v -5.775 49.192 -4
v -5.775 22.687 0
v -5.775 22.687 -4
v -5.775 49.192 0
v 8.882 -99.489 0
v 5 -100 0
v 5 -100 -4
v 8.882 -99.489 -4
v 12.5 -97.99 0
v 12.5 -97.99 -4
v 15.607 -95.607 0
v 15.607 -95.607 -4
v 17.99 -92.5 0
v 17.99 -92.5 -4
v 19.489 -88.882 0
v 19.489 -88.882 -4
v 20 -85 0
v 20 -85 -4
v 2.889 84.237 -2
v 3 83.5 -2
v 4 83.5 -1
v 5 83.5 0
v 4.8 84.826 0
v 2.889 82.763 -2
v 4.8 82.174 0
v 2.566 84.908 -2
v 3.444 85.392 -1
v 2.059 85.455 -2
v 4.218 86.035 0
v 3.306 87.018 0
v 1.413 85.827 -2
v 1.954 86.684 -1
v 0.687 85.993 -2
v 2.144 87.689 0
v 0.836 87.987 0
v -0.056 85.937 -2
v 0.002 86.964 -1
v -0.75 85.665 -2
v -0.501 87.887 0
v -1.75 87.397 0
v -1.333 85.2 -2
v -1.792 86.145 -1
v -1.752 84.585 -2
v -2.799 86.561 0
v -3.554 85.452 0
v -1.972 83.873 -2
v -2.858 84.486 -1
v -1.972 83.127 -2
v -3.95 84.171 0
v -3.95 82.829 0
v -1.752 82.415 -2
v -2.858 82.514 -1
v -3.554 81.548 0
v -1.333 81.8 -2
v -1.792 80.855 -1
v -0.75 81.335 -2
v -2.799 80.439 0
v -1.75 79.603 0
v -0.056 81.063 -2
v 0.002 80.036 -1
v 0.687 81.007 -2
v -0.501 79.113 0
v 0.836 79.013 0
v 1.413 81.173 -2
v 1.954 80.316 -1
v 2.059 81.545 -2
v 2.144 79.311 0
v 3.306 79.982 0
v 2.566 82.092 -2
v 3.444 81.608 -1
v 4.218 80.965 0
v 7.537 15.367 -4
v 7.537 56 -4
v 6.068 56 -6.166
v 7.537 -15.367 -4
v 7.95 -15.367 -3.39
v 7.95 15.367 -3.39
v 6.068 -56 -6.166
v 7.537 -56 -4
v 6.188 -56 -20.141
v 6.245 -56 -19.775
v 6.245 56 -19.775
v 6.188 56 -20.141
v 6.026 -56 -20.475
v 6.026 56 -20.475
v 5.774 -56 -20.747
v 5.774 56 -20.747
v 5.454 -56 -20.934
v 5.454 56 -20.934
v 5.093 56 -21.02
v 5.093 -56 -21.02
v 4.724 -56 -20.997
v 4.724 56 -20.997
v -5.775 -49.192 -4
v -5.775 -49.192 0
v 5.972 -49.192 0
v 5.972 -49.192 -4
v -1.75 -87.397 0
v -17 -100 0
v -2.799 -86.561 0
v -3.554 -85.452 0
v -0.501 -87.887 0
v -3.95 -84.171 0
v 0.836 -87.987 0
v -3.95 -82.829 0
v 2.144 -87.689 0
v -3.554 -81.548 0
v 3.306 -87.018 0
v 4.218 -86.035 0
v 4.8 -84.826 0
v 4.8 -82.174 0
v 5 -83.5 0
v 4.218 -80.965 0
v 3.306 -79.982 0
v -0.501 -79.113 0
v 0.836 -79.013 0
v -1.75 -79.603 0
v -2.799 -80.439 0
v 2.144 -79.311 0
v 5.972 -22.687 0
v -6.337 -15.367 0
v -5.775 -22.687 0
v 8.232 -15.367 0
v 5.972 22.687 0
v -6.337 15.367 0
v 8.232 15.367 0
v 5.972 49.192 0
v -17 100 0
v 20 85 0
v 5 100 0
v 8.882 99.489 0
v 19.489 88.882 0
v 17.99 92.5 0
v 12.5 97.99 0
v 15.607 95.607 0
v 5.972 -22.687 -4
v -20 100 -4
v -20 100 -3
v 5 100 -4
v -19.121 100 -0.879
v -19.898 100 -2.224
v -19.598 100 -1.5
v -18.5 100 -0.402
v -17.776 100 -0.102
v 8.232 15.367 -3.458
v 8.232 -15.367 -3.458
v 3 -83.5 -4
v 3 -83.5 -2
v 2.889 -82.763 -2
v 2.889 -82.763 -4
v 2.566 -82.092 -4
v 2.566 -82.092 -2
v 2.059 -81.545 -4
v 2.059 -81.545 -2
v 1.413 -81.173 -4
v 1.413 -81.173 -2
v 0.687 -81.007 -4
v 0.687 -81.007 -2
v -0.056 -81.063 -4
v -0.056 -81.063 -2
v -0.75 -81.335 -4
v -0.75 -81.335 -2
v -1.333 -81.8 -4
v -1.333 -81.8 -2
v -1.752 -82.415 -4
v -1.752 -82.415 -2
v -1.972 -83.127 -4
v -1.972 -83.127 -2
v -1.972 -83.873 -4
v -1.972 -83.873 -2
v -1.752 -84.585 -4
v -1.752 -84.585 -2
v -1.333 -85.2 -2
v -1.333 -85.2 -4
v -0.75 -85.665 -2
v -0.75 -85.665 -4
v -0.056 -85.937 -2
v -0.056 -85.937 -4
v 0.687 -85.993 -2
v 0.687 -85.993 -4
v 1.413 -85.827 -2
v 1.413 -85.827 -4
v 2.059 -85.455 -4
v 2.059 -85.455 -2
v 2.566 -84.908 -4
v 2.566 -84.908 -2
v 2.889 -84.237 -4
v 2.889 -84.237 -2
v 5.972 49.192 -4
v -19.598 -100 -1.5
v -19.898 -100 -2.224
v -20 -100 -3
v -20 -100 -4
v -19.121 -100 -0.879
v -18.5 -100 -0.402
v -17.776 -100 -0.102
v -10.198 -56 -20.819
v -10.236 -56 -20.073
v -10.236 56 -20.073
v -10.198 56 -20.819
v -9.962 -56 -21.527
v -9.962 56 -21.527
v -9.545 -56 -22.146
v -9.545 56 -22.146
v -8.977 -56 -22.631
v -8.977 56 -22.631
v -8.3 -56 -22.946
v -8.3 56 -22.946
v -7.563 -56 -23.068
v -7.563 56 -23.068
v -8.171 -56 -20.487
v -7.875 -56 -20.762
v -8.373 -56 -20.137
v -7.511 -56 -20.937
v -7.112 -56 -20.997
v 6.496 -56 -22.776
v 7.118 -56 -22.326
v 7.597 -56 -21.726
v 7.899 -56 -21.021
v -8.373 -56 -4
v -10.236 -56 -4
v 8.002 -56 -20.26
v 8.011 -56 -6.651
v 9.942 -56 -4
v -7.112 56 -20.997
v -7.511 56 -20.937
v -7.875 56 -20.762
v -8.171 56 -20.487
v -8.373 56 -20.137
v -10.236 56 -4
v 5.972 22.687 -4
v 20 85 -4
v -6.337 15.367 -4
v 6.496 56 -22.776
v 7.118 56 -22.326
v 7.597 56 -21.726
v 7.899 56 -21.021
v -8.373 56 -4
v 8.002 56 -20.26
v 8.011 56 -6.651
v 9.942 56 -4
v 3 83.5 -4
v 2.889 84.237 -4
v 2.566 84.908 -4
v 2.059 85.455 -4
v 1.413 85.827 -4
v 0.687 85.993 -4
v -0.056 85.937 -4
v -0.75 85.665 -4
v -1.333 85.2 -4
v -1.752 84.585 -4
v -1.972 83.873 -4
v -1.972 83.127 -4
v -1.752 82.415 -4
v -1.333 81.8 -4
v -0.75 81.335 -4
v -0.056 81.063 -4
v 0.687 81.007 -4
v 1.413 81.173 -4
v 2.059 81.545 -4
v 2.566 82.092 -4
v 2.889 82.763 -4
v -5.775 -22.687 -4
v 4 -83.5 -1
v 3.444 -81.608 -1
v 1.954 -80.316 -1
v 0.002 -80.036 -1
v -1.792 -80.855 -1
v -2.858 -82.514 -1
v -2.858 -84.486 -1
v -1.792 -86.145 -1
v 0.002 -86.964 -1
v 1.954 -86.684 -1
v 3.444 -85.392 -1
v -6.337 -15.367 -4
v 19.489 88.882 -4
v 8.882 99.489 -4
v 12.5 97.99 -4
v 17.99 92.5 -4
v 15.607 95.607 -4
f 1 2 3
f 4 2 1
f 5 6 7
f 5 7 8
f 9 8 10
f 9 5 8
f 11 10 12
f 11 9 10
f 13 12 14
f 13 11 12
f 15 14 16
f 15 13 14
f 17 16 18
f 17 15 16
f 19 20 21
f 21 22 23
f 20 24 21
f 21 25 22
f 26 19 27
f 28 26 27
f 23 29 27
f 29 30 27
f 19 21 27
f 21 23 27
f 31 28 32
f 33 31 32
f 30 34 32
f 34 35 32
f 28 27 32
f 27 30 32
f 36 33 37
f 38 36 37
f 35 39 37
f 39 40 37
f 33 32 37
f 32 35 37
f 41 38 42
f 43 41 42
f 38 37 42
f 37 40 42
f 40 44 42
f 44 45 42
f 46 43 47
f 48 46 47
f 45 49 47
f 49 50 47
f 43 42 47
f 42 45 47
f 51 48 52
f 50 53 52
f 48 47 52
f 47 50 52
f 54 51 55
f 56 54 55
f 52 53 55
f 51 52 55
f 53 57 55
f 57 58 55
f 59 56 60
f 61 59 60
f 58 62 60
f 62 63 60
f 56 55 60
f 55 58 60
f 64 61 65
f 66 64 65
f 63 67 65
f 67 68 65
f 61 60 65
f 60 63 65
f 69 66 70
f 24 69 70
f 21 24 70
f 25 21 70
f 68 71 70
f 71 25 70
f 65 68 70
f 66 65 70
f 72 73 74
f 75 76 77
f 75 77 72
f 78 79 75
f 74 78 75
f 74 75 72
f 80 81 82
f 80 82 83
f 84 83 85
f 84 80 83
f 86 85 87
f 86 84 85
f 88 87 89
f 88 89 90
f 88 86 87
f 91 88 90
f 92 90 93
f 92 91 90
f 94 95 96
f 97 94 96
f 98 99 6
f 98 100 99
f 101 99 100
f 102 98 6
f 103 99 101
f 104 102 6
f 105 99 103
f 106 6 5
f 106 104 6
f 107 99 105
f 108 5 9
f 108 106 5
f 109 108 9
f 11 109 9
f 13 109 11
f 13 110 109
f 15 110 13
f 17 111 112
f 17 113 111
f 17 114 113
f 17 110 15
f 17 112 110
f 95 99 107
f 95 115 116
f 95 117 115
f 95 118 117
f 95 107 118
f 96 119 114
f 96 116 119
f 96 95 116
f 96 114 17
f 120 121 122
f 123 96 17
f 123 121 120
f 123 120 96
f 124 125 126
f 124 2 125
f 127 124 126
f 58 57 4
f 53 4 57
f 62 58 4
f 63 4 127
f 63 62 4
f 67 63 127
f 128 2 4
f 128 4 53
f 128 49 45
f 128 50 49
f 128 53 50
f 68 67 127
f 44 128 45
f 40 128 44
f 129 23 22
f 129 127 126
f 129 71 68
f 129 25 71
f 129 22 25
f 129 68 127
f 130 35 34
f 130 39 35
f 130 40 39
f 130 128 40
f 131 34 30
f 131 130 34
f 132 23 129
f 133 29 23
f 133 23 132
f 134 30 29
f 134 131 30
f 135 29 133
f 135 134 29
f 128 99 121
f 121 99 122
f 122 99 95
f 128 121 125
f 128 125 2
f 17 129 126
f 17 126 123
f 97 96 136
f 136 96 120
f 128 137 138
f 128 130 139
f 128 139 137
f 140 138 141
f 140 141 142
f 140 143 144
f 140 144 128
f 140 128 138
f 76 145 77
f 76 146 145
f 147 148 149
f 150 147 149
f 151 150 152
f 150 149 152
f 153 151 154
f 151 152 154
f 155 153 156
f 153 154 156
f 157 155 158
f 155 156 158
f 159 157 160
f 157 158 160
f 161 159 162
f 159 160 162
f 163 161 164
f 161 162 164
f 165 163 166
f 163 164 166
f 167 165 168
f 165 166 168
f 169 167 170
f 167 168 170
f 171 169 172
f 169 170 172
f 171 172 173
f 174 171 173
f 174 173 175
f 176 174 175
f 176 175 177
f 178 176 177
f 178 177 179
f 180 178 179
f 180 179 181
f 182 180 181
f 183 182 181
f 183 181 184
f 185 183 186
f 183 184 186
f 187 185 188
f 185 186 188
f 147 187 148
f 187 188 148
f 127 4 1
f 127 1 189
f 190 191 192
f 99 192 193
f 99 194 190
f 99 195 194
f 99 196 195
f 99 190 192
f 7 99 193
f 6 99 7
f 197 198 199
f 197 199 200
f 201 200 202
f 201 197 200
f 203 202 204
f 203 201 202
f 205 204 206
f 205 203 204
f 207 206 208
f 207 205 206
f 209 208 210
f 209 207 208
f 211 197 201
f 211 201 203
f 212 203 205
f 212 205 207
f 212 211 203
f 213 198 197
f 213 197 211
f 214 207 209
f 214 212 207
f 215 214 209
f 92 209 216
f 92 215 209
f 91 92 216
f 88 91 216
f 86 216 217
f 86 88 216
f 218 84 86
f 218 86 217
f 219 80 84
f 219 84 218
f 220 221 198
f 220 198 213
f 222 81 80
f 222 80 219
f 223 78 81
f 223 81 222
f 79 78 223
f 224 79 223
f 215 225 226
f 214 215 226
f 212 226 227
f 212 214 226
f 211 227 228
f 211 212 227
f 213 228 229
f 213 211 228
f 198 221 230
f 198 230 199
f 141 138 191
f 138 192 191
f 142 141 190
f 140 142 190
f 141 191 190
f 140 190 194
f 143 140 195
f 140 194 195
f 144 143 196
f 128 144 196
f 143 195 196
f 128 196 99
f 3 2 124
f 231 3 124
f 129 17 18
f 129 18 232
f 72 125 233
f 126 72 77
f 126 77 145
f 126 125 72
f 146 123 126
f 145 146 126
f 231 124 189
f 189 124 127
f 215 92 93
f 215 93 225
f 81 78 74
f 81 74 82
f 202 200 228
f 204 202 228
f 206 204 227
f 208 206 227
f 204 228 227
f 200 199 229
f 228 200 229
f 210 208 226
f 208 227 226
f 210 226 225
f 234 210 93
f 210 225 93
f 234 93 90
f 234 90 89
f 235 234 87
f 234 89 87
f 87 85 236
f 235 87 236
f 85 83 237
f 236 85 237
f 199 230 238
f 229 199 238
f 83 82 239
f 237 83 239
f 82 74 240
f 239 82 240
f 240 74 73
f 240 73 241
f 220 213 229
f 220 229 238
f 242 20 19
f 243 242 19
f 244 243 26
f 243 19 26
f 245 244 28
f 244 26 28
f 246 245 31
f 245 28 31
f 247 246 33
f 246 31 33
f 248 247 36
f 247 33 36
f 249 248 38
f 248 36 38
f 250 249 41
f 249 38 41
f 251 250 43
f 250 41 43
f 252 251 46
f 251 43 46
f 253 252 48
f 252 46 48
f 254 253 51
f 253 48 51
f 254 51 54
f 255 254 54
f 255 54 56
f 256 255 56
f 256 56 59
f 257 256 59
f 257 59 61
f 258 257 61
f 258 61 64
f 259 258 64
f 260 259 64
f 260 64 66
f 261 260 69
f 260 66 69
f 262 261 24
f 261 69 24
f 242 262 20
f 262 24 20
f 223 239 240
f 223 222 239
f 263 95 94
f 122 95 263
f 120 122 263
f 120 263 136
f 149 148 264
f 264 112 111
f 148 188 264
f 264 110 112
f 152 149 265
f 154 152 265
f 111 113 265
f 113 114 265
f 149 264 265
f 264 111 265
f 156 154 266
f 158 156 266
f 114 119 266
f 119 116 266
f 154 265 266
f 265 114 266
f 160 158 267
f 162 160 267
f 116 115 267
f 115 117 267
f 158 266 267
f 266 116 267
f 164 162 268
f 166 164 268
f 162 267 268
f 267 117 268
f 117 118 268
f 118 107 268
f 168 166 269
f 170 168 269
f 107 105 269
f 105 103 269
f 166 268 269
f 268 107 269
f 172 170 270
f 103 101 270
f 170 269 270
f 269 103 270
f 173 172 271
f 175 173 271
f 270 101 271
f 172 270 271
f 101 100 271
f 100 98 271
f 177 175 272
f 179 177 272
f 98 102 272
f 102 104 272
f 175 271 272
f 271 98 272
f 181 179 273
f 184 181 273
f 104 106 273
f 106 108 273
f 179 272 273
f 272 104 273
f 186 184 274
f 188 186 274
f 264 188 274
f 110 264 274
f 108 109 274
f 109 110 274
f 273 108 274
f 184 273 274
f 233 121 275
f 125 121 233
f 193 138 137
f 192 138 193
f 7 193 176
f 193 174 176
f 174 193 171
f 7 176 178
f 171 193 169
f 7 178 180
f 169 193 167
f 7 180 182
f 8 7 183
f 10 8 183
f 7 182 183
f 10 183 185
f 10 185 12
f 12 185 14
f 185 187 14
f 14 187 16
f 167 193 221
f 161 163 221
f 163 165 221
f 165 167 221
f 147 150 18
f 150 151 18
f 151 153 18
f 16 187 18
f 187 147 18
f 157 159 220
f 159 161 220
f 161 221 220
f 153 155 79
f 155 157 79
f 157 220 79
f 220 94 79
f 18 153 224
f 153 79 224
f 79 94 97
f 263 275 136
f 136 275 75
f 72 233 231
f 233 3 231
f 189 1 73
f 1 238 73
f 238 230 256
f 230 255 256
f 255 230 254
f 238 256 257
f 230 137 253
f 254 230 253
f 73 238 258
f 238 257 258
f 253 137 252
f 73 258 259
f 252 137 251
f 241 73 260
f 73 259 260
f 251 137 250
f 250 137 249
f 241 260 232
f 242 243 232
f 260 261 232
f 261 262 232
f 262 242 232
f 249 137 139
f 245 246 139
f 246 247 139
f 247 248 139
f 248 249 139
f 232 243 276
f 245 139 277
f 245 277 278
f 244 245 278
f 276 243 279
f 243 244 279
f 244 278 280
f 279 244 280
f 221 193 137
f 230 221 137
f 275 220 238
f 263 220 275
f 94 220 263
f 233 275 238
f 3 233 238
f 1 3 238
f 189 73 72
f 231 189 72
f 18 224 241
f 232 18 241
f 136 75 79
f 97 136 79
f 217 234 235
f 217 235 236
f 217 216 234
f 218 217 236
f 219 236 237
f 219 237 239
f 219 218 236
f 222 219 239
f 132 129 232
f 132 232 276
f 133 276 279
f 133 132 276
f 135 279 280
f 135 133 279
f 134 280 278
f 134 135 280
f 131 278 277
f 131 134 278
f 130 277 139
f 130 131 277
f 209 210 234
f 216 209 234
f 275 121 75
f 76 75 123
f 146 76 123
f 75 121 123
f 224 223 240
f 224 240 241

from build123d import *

# Parameters (mm, degrees)
F0_R     = 2.5
F0_W     = 11.7464
F0_H     = 26.505243
F0_W_2   = 14.56834
F0_H_2   = 30.733124
F1_DEPTH = 4
F2_SIZE  = 2
F4_DEPTH = 56
F5_R     = 3


with BuildPart() as f1:
    # F0 (on Top) → F1 (new body)
    with BuildSketch(Plane.XY):
        with BuildLine():
            ThreePointArc((20, 85), (15.606602, 95.606602), (5, 100))
            Line((5, 100), (-20, 100))
            Line((-20, 100), (-20, -100))
            Line((-20, -100), (5, -100))
            ThreePointArc((5, -100), (15.606602, -95.606602), (20, -85))
            Line((20, -85), (20, 85))
        make_face()
        with Locations((0.5, -83.5)):
            Circle(F0_R, mode=Mode.SUBTRACT)
        with Locations((0.098345, -35.93968)):
            Rectangle(F0_W, F0_H, mode=Mode.SUBTRACT)
        with Locations((0.947373, 0)):
            Rectangle(F0_W_2, F0_H_2, mode=Mode.SUBTRACT)
        with Locations((0.098345, 35.93968)):
            Rectangle(F0_W, F0_H, mode=Mode.SUBTRACT)
        with Locations((0.5, 83.5)):
            Circle(F0_R, mode=Mode.SUBTRACT)
    extrude(amount=-F1_DEPTH)

    # F2
    f2_edges = [f1.edges().sort_by_distance(p)[0] for p in [
        (-2, -83.5, 0),
        (-2, 83.5, 0),
    ]]
    chamfer(f2_edges, length=F2_SIZE)

    # F3 (on Front) → F4 (join, symmetric)
    with BuildSketch(Plane.XZ):
        with BuildLine():
            Line((8.001845, -20.259996), (8.01102, -6.651434))
            Line((8.01102, -6.651434), (10.020183, -3.892345))
            Line((10.020183, -3.892345), (7.950272, -3.389892))
            Line((7.950272, -3.389892), (6.068421, -6.165784))
            Line((6.068421, -6.165784), (6.245231, -19.775091))
            ThreePointArc((6.245231, -19.775091), (5.774018, -20.746688), (4.723544, -20.996785))
            Line((4.723544, -20.996785), (-7.11199, -20.996785))
            ThreePointArc((-7.11199, -20.996785), (-7.875169, -20.761546), (-8.37348, -20.137473))
            Line((-8.37348, -20.137473), (-8.37348, -4))
            Line((-8.37348, -4), (-10.235702, -4))
            Line((-10.235702, -4), (-10.235702, -20.073208))
            ThreePointArc((-10.235702, -20.073208), (-9.544714, -22.146454), (-7.563292, -23.068289))
            Line((-7.563292, -23.068289), (6.496039, -22.776224))
            ThreePointArc((6.496039, -22.776224), (7.596641, -21.726186), (8.001845, -20.259996))
        make_face()
    extrude(amount=F4_DEPTH, both=True)

    # F5
    f5_edges = [f1.edges().sort_by_distance(p)[0] for p in [
        (-20, 0, 0),
    ]]
    fillet(f5_edges, radius=F5_R)


solid = f1.part
